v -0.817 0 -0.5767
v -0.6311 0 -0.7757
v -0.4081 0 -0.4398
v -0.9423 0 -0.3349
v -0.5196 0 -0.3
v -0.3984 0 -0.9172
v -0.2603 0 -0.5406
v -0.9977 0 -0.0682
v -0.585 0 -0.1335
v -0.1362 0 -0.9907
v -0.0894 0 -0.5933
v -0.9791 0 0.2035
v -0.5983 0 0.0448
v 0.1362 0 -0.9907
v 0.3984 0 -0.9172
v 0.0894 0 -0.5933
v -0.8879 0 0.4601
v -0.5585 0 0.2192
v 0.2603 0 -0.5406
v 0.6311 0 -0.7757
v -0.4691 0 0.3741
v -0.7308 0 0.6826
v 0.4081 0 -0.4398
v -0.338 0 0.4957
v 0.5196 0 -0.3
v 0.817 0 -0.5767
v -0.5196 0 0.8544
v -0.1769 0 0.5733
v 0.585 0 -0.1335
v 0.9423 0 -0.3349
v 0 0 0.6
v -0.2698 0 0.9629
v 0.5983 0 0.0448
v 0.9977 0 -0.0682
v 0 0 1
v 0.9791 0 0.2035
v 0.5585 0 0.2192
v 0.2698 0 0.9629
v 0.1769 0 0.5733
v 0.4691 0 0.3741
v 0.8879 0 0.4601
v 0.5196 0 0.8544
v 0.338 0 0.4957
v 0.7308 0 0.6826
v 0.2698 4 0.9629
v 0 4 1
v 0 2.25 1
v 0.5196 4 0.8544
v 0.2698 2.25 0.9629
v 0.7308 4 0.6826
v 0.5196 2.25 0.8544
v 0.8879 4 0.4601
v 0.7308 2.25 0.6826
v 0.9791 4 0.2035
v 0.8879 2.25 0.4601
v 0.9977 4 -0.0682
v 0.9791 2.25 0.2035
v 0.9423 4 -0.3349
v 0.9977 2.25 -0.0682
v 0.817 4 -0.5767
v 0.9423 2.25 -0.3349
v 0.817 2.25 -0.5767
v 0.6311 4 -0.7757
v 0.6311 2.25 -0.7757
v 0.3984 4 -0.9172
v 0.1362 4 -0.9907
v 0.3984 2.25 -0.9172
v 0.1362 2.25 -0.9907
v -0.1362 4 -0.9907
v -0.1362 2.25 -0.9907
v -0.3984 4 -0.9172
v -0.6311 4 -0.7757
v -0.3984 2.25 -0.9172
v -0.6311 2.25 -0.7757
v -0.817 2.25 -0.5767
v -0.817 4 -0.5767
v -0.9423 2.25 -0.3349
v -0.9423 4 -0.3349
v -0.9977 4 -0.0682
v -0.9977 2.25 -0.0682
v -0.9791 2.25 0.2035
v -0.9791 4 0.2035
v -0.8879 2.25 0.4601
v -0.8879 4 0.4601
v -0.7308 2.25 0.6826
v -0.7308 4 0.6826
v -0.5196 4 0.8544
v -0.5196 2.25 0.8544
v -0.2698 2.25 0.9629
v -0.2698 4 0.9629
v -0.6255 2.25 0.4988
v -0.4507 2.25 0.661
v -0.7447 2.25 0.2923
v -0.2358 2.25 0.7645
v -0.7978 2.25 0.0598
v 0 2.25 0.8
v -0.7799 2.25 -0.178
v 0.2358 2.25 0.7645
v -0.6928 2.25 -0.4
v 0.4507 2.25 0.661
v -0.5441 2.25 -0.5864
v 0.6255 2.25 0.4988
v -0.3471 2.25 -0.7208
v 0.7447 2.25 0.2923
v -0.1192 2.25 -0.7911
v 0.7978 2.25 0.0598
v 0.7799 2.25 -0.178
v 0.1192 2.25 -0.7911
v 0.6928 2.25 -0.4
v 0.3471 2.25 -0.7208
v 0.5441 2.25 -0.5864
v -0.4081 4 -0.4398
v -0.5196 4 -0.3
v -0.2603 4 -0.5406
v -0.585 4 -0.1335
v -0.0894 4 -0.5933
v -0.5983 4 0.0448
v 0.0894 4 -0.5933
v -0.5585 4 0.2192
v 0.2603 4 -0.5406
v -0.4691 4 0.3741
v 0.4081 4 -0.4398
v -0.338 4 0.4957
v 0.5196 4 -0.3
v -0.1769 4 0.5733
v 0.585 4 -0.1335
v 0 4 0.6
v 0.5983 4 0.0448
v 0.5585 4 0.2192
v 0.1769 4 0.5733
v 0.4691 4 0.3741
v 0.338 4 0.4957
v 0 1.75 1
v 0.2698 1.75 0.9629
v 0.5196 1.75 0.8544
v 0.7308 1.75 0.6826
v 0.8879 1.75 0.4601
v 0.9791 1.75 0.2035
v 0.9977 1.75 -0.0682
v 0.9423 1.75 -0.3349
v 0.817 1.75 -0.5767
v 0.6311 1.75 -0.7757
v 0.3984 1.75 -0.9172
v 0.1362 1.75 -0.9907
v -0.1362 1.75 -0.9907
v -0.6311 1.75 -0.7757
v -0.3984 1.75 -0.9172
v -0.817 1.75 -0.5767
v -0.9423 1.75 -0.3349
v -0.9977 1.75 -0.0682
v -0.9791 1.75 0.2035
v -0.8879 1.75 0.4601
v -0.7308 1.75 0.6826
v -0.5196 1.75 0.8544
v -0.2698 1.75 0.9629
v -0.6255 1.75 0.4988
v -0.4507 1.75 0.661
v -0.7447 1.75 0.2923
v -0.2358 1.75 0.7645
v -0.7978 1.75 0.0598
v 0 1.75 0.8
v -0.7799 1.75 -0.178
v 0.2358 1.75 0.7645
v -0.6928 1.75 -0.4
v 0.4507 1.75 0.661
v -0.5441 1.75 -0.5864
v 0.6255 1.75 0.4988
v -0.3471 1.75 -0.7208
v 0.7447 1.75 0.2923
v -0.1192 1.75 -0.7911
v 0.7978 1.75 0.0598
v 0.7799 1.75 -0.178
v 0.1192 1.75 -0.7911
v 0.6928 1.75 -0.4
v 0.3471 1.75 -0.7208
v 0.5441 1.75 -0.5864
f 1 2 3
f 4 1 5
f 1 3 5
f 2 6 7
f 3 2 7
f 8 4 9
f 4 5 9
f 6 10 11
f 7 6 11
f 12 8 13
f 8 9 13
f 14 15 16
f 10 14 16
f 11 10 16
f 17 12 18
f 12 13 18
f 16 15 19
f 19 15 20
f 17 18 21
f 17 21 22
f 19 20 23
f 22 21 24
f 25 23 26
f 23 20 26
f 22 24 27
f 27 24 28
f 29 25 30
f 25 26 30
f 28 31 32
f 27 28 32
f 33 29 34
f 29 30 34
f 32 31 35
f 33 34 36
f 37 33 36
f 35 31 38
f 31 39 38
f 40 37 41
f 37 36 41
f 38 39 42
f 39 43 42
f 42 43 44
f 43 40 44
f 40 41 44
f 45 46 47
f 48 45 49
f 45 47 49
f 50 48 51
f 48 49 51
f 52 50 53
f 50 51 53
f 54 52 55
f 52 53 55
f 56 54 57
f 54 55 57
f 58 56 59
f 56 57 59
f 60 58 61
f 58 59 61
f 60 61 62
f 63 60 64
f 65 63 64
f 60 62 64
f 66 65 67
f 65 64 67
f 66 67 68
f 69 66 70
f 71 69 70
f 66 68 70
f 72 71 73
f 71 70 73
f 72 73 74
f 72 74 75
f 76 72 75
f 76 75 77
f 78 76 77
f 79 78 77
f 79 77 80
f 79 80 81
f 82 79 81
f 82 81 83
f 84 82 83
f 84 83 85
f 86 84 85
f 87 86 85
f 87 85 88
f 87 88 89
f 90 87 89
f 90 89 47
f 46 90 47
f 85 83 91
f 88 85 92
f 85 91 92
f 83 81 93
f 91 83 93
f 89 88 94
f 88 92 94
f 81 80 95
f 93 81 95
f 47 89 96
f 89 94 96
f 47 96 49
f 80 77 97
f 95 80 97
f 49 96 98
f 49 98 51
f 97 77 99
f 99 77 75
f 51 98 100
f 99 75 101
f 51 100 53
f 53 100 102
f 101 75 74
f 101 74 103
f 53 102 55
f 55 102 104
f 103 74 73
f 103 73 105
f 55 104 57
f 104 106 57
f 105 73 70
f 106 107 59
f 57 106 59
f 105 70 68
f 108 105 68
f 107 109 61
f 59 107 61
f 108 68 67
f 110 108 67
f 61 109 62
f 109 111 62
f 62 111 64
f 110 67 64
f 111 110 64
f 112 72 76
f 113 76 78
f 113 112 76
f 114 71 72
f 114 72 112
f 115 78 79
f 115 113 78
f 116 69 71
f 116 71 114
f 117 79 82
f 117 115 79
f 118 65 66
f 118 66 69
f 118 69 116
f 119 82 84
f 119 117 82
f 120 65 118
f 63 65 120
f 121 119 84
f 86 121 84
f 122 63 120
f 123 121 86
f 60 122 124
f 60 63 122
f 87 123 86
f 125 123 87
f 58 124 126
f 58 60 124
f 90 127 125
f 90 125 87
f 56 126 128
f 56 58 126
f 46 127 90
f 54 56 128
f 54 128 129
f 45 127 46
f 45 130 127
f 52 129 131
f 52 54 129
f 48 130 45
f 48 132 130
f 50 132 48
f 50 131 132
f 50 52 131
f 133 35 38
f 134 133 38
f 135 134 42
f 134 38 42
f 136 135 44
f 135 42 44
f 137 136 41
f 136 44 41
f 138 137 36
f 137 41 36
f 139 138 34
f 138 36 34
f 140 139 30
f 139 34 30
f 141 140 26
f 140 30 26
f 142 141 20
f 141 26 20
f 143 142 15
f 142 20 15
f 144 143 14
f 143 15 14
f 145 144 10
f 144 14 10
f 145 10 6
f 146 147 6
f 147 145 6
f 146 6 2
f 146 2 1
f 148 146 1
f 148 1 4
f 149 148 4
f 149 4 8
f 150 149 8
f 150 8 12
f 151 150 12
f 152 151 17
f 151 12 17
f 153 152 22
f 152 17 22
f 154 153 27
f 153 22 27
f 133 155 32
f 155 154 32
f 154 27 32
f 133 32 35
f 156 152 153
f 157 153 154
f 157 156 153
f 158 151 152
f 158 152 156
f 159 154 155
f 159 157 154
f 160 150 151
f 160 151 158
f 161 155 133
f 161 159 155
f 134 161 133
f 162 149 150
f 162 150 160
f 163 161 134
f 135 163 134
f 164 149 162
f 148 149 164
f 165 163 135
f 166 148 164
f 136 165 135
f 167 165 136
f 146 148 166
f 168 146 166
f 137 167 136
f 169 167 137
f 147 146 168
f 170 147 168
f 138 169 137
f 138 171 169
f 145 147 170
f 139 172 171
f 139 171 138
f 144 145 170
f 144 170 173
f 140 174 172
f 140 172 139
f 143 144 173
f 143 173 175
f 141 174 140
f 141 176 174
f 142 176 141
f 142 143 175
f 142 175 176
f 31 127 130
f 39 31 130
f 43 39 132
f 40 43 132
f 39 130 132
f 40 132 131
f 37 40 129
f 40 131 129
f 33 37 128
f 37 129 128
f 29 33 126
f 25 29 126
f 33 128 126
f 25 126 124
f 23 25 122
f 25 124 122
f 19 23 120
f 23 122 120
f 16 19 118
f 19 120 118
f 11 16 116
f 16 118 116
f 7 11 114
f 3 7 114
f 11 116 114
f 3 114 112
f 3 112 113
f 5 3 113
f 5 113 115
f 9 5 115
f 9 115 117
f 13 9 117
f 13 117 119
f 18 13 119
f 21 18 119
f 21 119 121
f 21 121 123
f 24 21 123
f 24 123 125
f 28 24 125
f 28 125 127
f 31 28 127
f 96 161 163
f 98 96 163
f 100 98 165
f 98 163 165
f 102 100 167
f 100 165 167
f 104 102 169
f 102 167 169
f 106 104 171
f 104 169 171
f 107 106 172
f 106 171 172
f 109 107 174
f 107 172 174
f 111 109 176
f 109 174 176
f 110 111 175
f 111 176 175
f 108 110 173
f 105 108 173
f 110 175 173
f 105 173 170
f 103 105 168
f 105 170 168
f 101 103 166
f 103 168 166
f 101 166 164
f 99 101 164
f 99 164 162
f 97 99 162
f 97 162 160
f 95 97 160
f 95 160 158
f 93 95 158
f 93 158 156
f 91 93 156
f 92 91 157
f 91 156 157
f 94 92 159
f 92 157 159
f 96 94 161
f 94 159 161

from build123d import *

# Parameters (mm, degrees)
SKETCH2_R               = 1
BOSS_EXTRUDE1_DEPTH     = 4
CUT_EXTRUDE1_DEPTH      = 0.25
CUT_EXTRUDE1_DEPTH_BACK = 0.25
SKETCH4_OUTSIDE_W       = 4.98
SKETCH4_OUTSIDE_H       = 4.98
SKETCH4_OUTSIDE_R       = 0.8
SKETCH5_R               = 0.6
CUT_EXTRUDE2_DEPTH      = 7.5


with BuildPart() as part:
    # Sketch2 → Boss-Extrude1 (new body)
    with BuildSketch(Plane(origin=(0, 0, 0), x_dir=(1, 0, 0), z_dir=(0, 1, 0))):
        with Locations(Location((0, 0, 0), (0, 0, 270))):
            Circle(SKETCH2_R)
    extrude(amount=BOSS_EXTRUDE1_DEPTH)

    # Sketch4 outside → Cut-Extrude1 (cut, two sides: drawn at the far end of the back side and taken through both)
    with BuildSketch(Plane(origin=(0, 2, 0), x_dir=(1, 0, 0), z_dir=(0, 1, 0)).offset(-CUT_EXTRUDE1_DEPTH_BACK)):
        Rectangle(SKETCH4_OUTSIDE_W, SKETCH4_OUTSIDE_H)
        with Locations(Location((0, 0, 0), (0, 0, 270))):
            Circle(SKETCH4_OUTSIDE_R, mode=Mode.SUBTRACT)
    extrude(amount=CUT_EXTRUDE1_DEPTH + CUT_EXTRUDE1_DEPTH_BACK, mode=Mode.SUBTRACT)

    # Sketch5 → Cut-Extrude2 (cut)
    with BuildSketch(Plane(origin=(0, 4, 0), x_dir=(1, 0, 0), z_dir=(0, 1, 0))):
        with Locations(Location((0, 0, 0), (0, 0, 270))):
            Circle(SKETCH5_R)
    extrude(amount=-CUT_EXTRUDE2_DEPTH, mode=Mode.SUBTRACT)


solid = part.part
